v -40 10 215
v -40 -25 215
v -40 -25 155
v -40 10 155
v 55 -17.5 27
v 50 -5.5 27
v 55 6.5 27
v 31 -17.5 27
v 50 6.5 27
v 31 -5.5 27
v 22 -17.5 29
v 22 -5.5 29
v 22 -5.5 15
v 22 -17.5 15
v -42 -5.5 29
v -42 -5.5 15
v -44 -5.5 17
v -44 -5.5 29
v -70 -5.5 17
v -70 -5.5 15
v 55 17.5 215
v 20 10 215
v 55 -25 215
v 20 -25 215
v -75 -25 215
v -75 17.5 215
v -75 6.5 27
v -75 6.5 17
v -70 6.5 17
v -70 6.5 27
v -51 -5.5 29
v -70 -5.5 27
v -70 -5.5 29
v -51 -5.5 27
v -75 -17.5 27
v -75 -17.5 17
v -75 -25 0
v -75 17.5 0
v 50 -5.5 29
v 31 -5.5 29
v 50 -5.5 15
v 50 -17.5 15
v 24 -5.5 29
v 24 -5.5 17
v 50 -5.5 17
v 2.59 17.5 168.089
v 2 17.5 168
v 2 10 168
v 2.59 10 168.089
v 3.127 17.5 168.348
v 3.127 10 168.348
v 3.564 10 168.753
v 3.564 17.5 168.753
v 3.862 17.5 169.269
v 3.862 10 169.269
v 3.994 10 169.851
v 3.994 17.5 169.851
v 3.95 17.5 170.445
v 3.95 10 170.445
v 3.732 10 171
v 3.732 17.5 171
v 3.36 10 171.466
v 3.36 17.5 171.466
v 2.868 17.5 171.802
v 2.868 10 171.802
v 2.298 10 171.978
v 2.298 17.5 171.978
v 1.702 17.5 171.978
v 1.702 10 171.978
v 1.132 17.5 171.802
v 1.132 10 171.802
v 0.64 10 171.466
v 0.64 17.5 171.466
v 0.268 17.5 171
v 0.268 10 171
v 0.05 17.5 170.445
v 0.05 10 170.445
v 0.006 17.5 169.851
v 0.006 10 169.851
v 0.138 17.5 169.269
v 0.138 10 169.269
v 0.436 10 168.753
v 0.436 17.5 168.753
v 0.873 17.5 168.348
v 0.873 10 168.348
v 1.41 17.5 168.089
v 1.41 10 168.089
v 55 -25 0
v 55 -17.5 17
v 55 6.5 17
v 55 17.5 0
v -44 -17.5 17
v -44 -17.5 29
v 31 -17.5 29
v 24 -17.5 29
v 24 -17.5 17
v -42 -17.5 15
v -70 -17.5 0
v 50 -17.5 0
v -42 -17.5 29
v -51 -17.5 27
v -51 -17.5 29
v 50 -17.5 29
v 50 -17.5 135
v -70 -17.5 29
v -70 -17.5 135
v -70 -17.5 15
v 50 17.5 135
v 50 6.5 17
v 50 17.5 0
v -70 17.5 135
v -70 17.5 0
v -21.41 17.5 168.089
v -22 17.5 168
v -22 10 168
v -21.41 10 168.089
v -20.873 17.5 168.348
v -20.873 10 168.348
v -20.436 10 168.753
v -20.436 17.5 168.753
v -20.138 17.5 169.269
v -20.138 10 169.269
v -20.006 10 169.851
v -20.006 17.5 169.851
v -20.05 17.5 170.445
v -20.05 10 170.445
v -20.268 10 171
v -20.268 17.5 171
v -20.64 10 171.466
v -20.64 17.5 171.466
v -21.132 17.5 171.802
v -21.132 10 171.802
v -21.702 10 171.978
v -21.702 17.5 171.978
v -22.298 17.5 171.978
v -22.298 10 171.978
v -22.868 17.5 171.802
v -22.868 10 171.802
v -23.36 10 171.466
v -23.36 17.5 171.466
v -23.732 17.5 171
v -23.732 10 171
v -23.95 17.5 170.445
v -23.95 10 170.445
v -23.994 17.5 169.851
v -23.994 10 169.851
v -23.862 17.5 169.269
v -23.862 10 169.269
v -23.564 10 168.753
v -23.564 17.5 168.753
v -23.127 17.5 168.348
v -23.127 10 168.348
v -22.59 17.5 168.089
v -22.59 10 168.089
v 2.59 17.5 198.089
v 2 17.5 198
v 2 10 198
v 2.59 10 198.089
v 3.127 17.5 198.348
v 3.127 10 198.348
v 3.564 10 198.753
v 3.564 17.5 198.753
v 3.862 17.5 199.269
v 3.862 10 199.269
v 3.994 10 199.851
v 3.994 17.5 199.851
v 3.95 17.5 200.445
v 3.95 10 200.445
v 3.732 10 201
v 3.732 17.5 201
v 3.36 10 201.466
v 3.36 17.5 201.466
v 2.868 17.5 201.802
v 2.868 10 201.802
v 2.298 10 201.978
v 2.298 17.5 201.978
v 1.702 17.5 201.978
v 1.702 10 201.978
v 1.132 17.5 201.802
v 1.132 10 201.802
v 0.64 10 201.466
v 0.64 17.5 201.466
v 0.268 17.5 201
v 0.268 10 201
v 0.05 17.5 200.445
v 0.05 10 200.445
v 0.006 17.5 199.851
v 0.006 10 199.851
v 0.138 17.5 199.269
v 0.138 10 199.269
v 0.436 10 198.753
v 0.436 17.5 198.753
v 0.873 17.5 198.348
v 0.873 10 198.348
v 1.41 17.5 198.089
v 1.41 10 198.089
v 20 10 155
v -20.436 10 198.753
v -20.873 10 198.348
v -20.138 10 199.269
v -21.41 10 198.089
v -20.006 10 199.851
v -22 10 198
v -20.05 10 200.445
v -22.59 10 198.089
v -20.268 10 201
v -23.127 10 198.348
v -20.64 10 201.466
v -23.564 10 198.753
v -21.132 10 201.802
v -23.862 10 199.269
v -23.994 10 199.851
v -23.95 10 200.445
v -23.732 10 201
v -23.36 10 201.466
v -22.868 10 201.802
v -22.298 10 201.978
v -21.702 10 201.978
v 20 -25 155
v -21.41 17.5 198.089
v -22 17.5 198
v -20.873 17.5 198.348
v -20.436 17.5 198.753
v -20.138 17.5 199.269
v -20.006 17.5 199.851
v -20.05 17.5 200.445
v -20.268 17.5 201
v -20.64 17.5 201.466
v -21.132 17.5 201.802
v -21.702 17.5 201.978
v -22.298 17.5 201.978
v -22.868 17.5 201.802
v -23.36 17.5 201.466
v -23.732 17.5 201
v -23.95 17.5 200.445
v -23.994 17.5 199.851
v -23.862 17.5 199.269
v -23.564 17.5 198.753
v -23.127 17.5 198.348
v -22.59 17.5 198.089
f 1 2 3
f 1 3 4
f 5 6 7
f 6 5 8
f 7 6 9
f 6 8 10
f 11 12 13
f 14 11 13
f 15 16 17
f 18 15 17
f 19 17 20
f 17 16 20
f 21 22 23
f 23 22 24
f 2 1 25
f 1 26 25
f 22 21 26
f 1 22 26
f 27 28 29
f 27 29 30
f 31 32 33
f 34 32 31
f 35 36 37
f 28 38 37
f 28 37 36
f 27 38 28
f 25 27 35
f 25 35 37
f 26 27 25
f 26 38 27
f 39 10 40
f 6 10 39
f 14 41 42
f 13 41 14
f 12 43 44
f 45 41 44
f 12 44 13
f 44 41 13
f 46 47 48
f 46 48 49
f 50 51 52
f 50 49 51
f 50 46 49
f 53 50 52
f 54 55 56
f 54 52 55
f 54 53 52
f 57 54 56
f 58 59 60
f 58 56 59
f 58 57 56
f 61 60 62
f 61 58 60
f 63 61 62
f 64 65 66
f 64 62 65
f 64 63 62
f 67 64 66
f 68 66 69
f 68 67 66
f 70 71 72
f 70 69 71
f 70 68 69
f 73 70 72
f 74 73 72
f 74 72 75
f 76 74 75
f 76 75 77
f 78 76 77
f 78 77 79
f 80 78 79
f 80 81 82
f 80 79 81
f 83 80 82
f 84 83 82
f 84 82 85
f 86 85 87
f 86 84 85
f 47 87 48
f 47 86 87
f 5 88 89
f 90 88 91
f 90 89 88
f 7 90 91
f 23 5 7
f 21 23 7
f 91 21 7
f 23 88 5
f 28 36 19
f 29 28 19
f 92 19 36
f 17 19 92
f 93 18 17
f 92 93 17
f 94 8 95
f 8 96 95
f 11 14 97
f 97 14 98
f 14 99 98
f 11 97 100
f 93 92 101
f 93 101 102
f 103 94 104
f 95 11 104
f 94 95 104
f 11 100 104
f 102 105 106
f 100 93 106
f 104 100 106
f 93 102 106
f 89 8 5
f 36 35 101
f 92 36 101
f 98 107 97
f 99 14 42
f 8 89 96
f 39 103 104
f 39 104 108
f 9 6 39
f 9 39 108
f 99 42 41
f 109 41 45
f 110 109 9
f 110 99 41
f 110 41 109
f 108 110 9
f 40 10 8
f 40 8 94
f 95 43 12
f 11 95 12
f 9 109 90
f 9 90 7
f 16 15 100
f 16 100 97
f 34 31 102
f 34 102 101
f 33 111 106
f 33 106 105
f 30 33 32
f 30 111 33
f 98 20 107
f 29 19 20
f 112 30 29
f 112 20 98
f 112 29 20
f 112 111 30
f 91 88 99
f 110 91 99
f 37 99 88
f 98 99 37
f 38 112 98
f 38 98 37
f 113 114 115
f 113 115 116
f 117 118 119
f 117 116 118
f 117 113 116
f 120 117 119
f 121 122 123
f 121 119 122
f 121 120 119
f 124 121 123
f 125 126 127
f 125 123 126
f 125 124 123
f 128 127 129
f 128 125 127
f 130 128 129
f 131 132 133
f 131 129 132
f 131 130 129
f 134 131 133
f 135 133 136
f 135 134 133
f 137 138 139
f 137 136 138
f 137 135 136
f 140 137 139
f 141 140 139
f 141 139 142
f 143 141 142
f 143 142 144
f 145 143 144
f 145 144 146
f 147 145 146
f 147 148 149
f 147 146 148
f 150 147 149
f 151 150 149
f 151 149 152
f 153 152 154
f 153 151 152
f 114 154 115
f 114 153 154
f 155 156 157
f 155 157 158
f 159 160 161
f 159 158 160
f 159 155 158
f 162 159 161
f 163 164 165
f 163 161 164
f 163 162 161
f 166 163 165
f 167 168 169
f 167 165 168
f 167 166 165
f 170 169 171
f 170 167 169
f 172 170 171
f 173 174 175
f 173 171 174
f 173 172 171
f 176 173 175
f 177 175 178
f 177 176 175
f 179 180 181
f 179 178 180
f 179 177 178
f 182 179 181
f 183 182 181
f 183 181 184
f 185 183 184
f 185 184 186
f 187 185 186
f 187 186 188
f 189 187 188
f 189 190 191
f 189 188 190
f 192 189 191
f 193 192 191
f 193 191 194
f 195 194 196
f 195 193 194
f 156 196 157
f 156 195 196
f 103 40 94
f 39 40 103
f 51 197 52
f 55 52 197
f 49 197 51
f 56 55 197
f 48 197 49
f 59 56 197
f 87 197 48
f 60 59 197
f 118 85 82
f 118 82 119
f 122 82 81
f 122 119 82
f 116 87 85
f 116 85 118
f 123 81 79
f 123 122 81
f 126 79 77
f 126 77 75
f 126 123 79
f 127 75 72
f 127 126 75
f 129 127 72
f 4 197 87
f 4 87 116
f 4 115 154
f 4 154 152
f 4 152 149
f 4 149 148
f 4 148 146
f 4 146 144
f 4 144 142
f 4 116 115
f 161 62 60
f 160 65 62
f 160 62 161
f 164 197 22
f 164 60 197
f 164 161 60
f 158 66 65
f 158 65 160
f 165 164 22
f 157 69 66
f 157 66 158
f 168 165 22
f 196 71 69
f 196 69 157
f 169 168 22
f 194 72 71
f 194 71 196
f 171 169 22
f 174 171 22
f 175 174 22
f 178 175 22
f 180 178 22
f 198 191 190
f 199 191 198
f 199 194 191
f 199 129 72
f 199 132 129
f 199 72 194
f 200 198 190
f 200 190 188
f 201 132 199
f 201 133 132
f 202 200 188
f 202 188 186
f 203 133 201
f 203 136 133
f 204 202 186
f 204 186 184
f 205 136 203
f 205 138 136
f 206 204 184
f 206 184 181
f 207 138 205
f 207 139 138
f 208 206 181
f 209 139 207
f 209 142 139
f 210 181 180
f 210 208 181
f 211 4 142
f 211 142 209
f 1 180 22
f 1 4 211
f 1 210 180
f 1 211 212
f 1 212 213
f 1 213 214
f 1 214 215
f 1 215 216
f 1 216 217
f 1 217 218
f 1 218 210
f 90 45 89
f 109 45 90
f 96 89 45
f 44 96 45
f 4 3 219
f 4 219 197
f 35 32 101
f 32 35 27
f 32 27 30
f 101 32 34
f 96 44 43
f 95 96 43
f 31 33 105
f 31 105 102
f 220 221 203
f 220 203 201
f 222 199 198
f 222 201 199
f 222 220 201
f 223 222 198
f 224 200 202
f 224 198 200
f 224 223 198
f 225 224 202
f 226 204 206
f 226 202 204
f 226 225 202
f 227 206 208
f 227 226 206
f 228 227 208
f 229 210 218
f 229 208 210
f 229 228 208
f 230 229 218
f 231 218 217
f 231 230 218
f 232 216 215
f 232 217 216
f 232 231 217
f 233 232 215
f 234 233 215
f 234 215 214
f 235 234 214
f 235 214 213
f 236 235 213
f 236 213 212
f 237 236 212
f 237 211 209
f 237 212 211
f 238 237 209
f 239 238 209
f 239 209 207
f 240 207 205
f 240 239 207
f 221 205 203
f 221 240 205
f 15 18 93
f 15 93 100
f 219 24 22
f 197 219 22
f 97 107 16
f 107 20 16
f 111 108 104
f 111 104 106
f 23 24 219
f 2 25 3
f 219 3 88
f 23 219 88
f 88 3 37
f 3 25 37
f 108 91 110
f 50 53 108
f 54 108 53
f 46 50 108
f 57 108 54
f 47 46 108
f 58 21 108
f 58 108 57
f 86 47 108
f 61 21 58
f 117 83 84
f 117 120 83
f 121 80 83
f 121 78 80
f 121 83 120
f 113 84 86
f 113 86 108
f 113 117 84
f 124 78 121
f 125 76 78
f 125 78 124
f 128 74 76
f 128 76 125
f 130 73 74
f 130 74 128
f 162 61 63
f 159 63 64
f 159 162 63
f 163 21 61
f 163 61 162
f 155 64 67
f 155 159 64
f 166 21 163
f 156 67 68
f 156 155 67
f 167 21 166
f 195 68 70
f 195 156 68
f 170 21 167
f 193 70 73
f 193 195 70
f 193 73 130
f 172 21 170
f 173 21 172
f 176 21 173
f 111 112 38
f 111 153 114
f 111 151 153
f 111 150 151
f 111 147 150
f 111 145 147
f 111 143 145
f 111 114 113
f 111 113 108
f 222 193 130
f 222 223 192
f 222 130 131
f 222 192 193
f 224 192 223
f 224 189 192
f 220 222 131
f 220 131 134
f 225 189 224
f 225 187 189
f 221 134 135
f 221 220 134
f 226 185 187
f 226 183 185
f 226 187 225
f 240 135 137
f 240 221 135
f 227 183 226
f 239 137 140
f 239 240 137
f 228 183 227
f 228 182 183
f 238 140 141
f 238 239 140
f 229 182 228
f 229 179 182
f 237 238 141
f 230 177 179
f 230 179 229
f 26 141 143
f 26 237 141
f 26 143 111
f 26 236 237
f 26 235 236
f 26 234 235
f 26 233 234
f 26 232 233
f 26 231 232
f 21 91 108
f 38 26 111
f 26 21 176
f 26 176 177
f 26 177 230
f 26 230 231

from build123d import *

# Parameters (mm, degrees)
SKETCH2_W                = 150
SKETCH2_H                = 40
BOSS_EXTRUDE1_DEPTH      = 225
SKETCH3_W                = 140
SKETCH3_H                = 35
CUT_EXTRUDE1_DEPTH       = 50
SKETCH4_W                = 26
SKETCH4_H                = 2
SKETCH4_W_2              = 20
BOSS_EXTRUDE2_DEPTH      = 15
SKETCH6_W                = 10
SKETCH6_H                = 15
CUT_EXTRUDE2_DEPTH       = 15
CUT_EXTRUDE3_DEPTH       = 67
SKETCH9_W                = 10
SKETCH9_H                = 15
CUT_EXTRUDE4_DEPTH       = 67
SKETCH12_W               = 14
SKETCH12_H               = 2
BOSS_EXTRUDE3_DEPTH      = 2.5
FILLET1_R                = 0.5
MIRROR3_START            = 196
MIRROR3_DEPTH            = 14
MIRROR3_START_2          = 15
MIRROR3_2_DEPTH          = 14
MIRROR3_3_DEPTH          = 2
MIRROR3_START_3          = 208
MIRROR3_4_DEPTH          = 2
MIRROR3_5_DEPTH          = 2
MIRROR3_START_4          = 27
MIRROR3_6_DEPTH          = 2
SKETCH16_W               = 32.5
SKETCH16_H               = 11.5
BOSS_EXTRUDE5_DEPTH      = 5
SKETCH17_R               = 1
BOSS_EXTRUDE7_DEPTH      = 25
SKETCH18_W               = 5
SKETCH18_H               = 50
SKETCH18_W_2             = 10
SKETCH18_H_2             = 5
BOSS_EXTRUDE8_DEPTH      = 7.5
SKETCH24_W               = 5.5
SKETCH24_H               = 28
BOSS_EXTRUDE11_DEPTH     = 50
SKETCH25_W               = 5
SKETCH25_H               = 28
BOSS_EXTRUDE12_DEPTH     = 190
SKETCH26_W               = 5
SKETCH26_H               = 28
BOSS_EXTRUDE13_DEPTH     = 190
SKETCH27_R               = 2.55
BOSS_EXTRUDE14_DEPTH     = 10
SKETCH29_W               = 10
SKETCH29_H               = 15
CUT_EXTRUDE5_DEPTH       = 19
SKETCH30_W               = 15
SKETCH30_H               = 20
BOSS_EXTRUDE15_DEPTH     = 7.5
SKETCH33_W               = 140
SKETCH33_H               = 35
BOSS_EXTRUDE16_DEPTH     = 50
BOSS_EXTRUDE18_DEPTH     = 5
CUT_EXTRUDE9_DEPTH       = 303.293317822
CUT_EXTRUDE9_DEPTH_BACK  = 303.293317822
SKETCH37_W               = 10
SKETCH37_H               = 45
SKETCH41_W               = 150
SKETCH41_H               = 50
CUT_EXTRUDE12_DEPTH      = 2.5
SKETCH42_W               = 2
SKETCH42_H               = 12
CUT_EXTRUDE13_DEPTH      = 15
SKETCH43_W               = 1
SKETCH43_H               = 2
CUT_EXTRUDE14_DEPTH      = 15
SKETCH44_W               = 10
SKETCH44_H               = 3
BOSS_EXTRUDE19_DEPTH     = 5
SKETCH45_W               = 10
SKETCH45_H               = 3
BOSS_EXTRUDE20_DEPTH     = 5
SKETCH46_W               = 65.791508331
SKETCH46_H               = 202.821994136
SKETCH46_W_2             = 83.130638558
CUT_EXTRUDE15_DEPTH      = 257.527288997
SKETCH50_W               = 14
SKETCH50_H               = 2
CUT_EXTRUDE18_DEPTH      = 2.5
SKETCH51_W               = 2
SKETCH51_H               = 14
BOSS_EXTRUDE21_DEPTH     = 15
SKETCH52_W               = 19
SKETCH52_H               = 2
CUT_EXTRUDE19_DEPTH      = 3
SKETCH53_W               = 10
SKETCH53_H               = 12
CUT_EXTRUDE20_DEPTH      = 5
SKETCH54_W               = 14
SKETCH54_H               = 2
CUT_EXTRUDE21_DEPTH      = 2.5
SKETCH55_W               = 1.5
SKETCH55_H               = 2
CUT_EXTRUDE22_DEPTH      = 15
SKETCH56_W               = 2
SKETCH56_H               = 14
BOSS_EXTRUDE22_DEPTH     = 15
SKETCH57_W               = 17.5
SKETCH57_H               = 2
CUT_EXTRUDE23_DEPTH      = 3
SKETCH58_W               = 1.5
SKETCH58_H               = 2
BOSS_EXTRUDE23_DEPTH     = 12
SKETCH59_W               = 10
SKETCH59_H               = 12
CUT_EXTRUDE24_DEPTH      = 5
SKETCH61_W               = 150
SKETCH61_H               = 32.5
CUT_EXTRUDE26_DEPTH      = 230.360524066
SKETCH63_W               = 150
SKETCH63_H               = 165
CUT_EXTRUDE27_DEPTH      = 10
SKETCH71_W               = 215
SKETCH71_H               = 42.5
CUT_EXTRUDE28_DEPTH      = 85
BOSS_EXTRUDE26_DEPTH     = 65
SKETCH73_W               = 10
SKETCH73_H               = 15
BOSS_EXTRUDE27_DEPTH     = 5
BOSS_EXTRUDE28_REACH     = 233.815
BOSS_EXTRUDE28_START     = -3
SKETCH74_W               = 5
SKETCH74_H               = 35
BOSS_EXTRUDE29_DEPTH     = 50
SKETCH75_W               = 10
SKETCH75_H               = 24
CUT_EXTRUDE29_DEPTH      = 14
CUT_EXTRUDE30_DEPTH      = 232.638187698
CUT_EXTRUDE30_DEPTH_BACK = 232.638187698
SKETCH76_R               = 2
CUT_EXTRUDE31_START      = -40
CUT_EXTRUDE31_OUTLINE_W  = 35
CUT_EXTRUDE31_OUTLINE_H  = 60
CUT_EXTRUDE31_DEPTH      = 60
SKETCH78_W               = 120
SKETCH78_H               = 35
CUT_EXTRUDE32_DEPTH      = 85


# Read off the part's stored shape, not the designer's step: Mirror3, Cut-Extrude31
with BuildPart() as part:
    # Sketch2 → Boss-Extrude1 (new body)
    with BuildSketch(Plane.XY):
        Rectangle(SKETCH2_W, SKETCH2_H)
    extrude(amount=BOSS_EXTRUDE1_DEPTH)

    # Sketch3 → Cut-Extrude1 (cut)
    with BuildSketch(Plane.XY.offset(225)):
        Rectangle(SKETCH3_W, SKETCH3_H)
    cut_extrude1 = extrude(amount=-CUT_EXTRUDE1_DEPTH, mode=Mode.SUBTRACT)

    # Sketch4 → Boss-Extrude2 (add)
    with BuildSketch(Plane(origin=(0, -17.5, 0), x_dir=(1, 0, 0), z_dir=(0, 1, 0))):
        Polygon((-42, -196), (-44, -196), (-44, -208), (-44, -210), (-42, -210), align=None)
        with Locations((-57, -209)):
            Rectangle(SKETCH4_W, SKETCH4_H)
        with Locations((-60, -197)):
            Rectangle(SKETCH4_W_2, SKETCH4_H)
        Polygon((70, -210), (70, -208), (44, -208), (44, -196), (42, -196), (42, -210), (44, -210), align=None)
        with Locations((60, -197)):
            Rectangle(SKETCH4_W_2, SKETCH4_H)
    boss_extrude2 = extrude(amount=BOSS_EXTRUDE2_DEPTH)

    # Sketch6 → Cut-Extrude2 (cut)
    with BuildSketch(Plane(origin=(-70, 0, 0), x_dir=(0, 0, -1), z_dir=(1, 0, 0))):
        with Locations((-203, -10)):
            Rectangle(SKETCH6_W, SKETCH6_H)
    cut_extrude2 = extrude(amount=-CUT_EXTRUDE2_DEPTH, mode=Mode.SUBTRACT)

    # Sketch8 → Cut-Extrude3 (cut)
    with BuildSketch(Plane(origin=(0, -17.5, 0), x_dir=(1, 0, 0), z_dir=(0, 1, 0))):
        with BuildLine():
            Line((-64.5, -179.5), (-49.5, -179.5))
            ThreePointArc((-49.5, -179.5), (-46, -183), (-49.5, -186.5))
            Line((-49.5, -186.5), (-64.5, -186.5))
            ThreePointArc((-64.5, -186.5), (-68, -183), (-64.5, -179.5))
        make_face()
        with BuildLine():
            Line((64.5, -179.5), (49.5, -179.5))
            ThreePointArc((49.5, -179.5), (46, -183), (49.5, -186.5))
            Line((49.5, -186.5), (64.5, -186.5))
            ThreePointArc((64.5, -186.5), (68, -183), (64.5, -179.5))
        make_face()
    cut_extrude3 = extrude(amount=CUT_EXTRUDE3_DEPTH, mode=Mode.SUBTRACT)

    # Sketch9 → Cut-Extrude4 (cut)
    with BuildSketch(Plane.ZY.offset(-70)):
        with Locations((203, -10)):
            Rectangle(SKETCH9_W, SKETCH9_H)
    cut_extrude4 = extrude(amount=-CUT_EXTRUDE4_DEPTH, mode=Mode.SUBTRACT)

    # Mirror1: Cut-Extrude1, Boss-Extrude2, Cut-Extrude2, Cut-Extrude3, Cut-Extrude4 across plane
    add(cut_extrude1.mirror(Plane.XY.offset(112.5)), mode=Mode.SUBTRACT)
    add(boss_extrude2.mirror(Plane.XY.offset(112.5)))
    add(cut_extrude2.mirror(Plane.XY.offset(112.5)), mode=Mode.SUBTRACT)
    add(cut_extrude3.mirror(Plane.XY.offset(112.5)), mode=Mode.SUBTRACT)
    add(cut_extrude4.mirror(Plane.XY.offset(112.5)), mode=Mode.SUBTRACT)

    # Sketch12 → Boss-Extrude3 (add)
    with BuildSketch(Plane.ZY.offset(-70)):
        with Locations((22, -1.5)):
            Rectangle(SKETCH12_W, SKETCH12_H)
    extrude(amount=BOSS_EXTRUDE3_DEPTH)

    # Fillet1
    fillet1_edges = [part.edges().sort_by_distance(p)[0] for p in [
        (67.5, -2.5, 22),
    ]]
    fillet(fillet1_edges, radius=FILLET1_R)

    # Mirror3 outline → Mirror3 (add)
    with BuildSketch(Plane.XY.offset(MIRROR3_START)):
        with BuildLine():
            Line((-70, -2.5), (-68, -2.5))
            ThreePointArc((-68, -2.5), (-67.646446609, -2.353553391), (-67.5, -2))
            Line((-67.5, -2), (-67.5, -0.5))
            Line((-67.5, -0.5), (-70, -0.5))
            Line((-70, -0.5), (-70, -2.5))
        make_face()
        with BuildLine():
            Line((68, -2.5), (70, -2.5))
            Line((70, -2.5), (70, -0.5))
            Line((70, -0.5), (67.5, -0.5))
            Line((67.5, -0.5), (67.5, -2))
            ThreePointArc((67.5, -2), (67.646446609, -2.353553391), (68, -2.5))
        make_face()
    extrude(amount=MIRROR3_DEPTH)

    # Mirror3 2 outline → Mirror3 2 (add)
    with BuildSketch(Plane.XY.offset(MIRROR3_START_2)):
        with BuildLine():
            Line((-70, -2.5), (-68, -2.5))
            ThreePointArc((-68, -2.5), (-67.646446609, -2.353553391), (-67.5, -2))
            Line((-67.5, -2), (-67.5, -0.5))
            Line((-67.5, -0.5), (-70, -0.5))
            Line((-70, -0.5), (-70, -2.5))
        make_face()
    extrude(amount=MIRROR3_2_DEPTH)

    # Mirror3 3 outline → Mirror3 3 (add)
    with BuildSketch(Plane.XY.offset(MIRROR3_START)):
        with BuildLine():
            ThreePointArc((-67.5, -2), (-67.646446609, -2.353553391), (-68, -2.5))
            Line((-68, -2.5), (-67.5, -2.5))
            Line((-67.5, -2.5), (-67.5, -2))
        make_face()
        with BuildLine():
            Line((67.5, -2.5), (68, -2.5))
            ThreePointArc((68, -2.5), (67.646446609, -2.353553391), (67.5, -2))
            Line((67.5, -2), (67.5, -2.5))
        make_face()
    extrude(amount=MIRROR3_3_DEPTH)

    # Mirror3 4 outline → Mirror3 4 (add)
    with BuildSketch(Plane.XY.offset(MIRROR3_START_3)):
        with BuildLine():
            ThreePointArc((-67.5, -2), (-67.646446609, -2.353553391), (-68, -2.5))
            Line((-68, -2.5), (-67.5, -2.5))
            Line((-67.5, -2.5), (-67.5, -2))
        make_face()
        with BuildLine():
            Line((67.5, -2.5), (68, -2.5))
            ThreePointArc((68, -2.5), (67.646446609, -2.353553391), (67.5, -2))
            Line((67.5, -2), (67.5, -2.5))
        make_face()
    extrude(amount=MIRROR3_4_DEPTH)

    # Mirror3 5 outline → Mirror3 5 (add)
    with BuildSketch(Plane.XY.offset(MIRROR3_START_2)):
        with BuildLine():
            ThreePointArc((-67.5, -2), (-67.646446609, -2.353553391), (-68, -2.5))
            Line((-68, -2.5), (-67.5, -2.5))
            Line((-67.5, -2.5), (-67.5, -2))
        make_face()
    extrude(amount=MIRROR3_5_DEPTH)

    # Mirror3 6 outline → Mirror3 6 (add)
    with BuildSketch(Plane.XY.offset(MIRROR3_START_4)):
        with BuildLine():
            ThreePointArc((-67.5, -2), (-67.646446609, -2.353553391), (-68, -2.5))
            Line((-68, -2.5), (-67.5, -2.5))
            Line((-67.5, -2.5), (-67.5, -2))
        make_face()
    extrude(amount=MIRROR3_6_DEPTH)

    # Sketch16 → Boss-Extrude5 (add)
    with BuildSketch(Plane(origin=(-70, 0, 0), x_dir=(0, 0, -1), z_dir=(1, 0, 0))):
        with Locations((16.25, -14.25)):
            Rectangle(SKETCH16_W, SKETCH16_H)
    boss_extrude5 = extrude(amount=-BOSS_EXTRUDE5_DEPTH)

    # Mirror4: Boss-Extrude5 across plane
    add(boss_extrude5.mirror(Plane(origin=(0, 0, 0), x_dir=(0, 0, 1), z_dir=(1, 0, 0))))

    # Sketch17 → Boss-Extrude7 (add)
    with BuildSketch(Plane.ZY.offset(-70)):
        with Locations(Location((-29.5, -14.25, 0), (0, 0, 270))):
            Circle(SKETCH17_R)
        with Locations(Location((-3, -14.25, 0), (0, 0, 270))):
            Circle(SKETCH17_R)
    boss_extrude7 = extrude(amount=BOSS_EXTRUDE7_DEPTH)

    # Mirror5: Boss-Extrude7 across plane
    add(boss_extrude7.mirror(Plane(origin=(0, 0, 0), x_dir=(0, 0, 1), z_dir=(1, 0, 0))))

    # Sketch18 → Boss-Extrude8 (add)
    with BuildSketch(Plane(origin=(0, 20, 0), x_dir=(1, 0, 0), z_dir=(0, 1, 0))):
        with Locations((-67.5, -80.5)):
            Rectangle(SKETCH18_W, SKETCH18_H)
        with Locations((67.5, -144.5)):
            Rectangle(SKETCH18_W, SKETCH18_H)
        with Locations((-30, -172)):
            Rectangle(SKETCH18_W_2, SKETCH18_H_2)
        with Locations((-30, -117)):
            Rectangle(SKETCH18_W_2, SKETCH18_H_2)
        with Locations((30, -108)):
            Rectangle(SKETCH18_W_2, SKETCH18_H_2)
        with Locations((30, -53)):
            Rectangle(SKETCH18_W_2, SKETCH18_H_2)
    extrude(amount=BOSS_EXTRUDE8_DEPTH)

    # Sketch24 → Boss-Extrude11 (add)
    with BuildSketch(Plane.ZY.offset(75)):
        with Locations((84.75, -6)):
            Rectangle(SKETCH24_W, SKETCH24_H)
    boss_extrude11 = extrude(amount=BOSS_EXTRUDE11_DEPTH)

    # Sketch25 → Boss-Extrude12 (add)
    with BuildSketch(Plane(origin=(0, 0, 82), x_dir=(-1, 0, 0), z_dir=(0, 0, -1))):
        with Locations((122.5, -6)):
            Rectangle(SKETCH25_W, SKETCH25_H)
    extrude(amount=BOSS_EXTRUDE12_DEPTH)

    # Mirror12: Boss-Extrude11 across plane
    add(boss_extrude11.mirror(Plane(origin=(0, 0, 0), x_dir=(0, 0, 1), z_dir=(1, 0, 0))))

    # Sketch26 → Boss-Extrude13 (add)
    with BuildSketch(Plane(origin=(0, 0, 82), x_dir=(-1, 0, 0), z_dir=(0, 0, -1))):
        with Locations((-122.5, -6)):
            Rectangle(SKETCH26_W, SKETCH26_H)
    extrude(amount=BOSS_EXTRUDE13_DEPTH)

    # Sketch27 → Boss-Extrude14 (add)
    with BuildSketch(Plane.ZY.offset(-120)):
        with Locations(Location((-100.5, -6, 0), (0, 0, 180))):
            Circle(SKETCH27_R)
    extrude(amount=BOSS_EXTRUDE14_DEPTH)

    # Sketch29 → Cut-Extrude5 (cut)
    with BuildSketch(Plane.ZY.offset(125)):
        with Locations((-100.5, -6)):
            Rectangle(SKETCH29_W, SKETCH29_H)
    extrude(amount=-CUT_EXTRUDE5_DEPTH, mode=Mode.SUBTRACT)

    # Sketch30 → Boss-Extrude15 (add)
    with BuildSketch(Plane.ZY.offset(125)):
        with Locations((-100.5, -6)):
            Rectangle(SKETCH30_W, SKETCH30_H)
    extrude(amount=BOSS_EXTRUDE15_DEPTH)

    # Sketch33 → Boss-Extrude16 (add)
    with BuildSketch(Plane.XY.offset(175)):
        Rectangle(SKETCH33_W, SKETCH33_H)
    extrude(amount=BOSS_EXTRUDE16_DEPTH)

    # Sketch36 → Boss-Extrude18 (add)
    with BuildSketch(Plane.XZ.offset(20)):
        Polygon((-75, 225), (-75, 87.5), (-125, 87.5), (-125, -108), (-120, -108), (-120, 82), (-75, 82), (-75, -32.5), (-70, -32.5), (-70, 0), (70, 0), (70, -32.5), (75, -32.5), (75, 82), (120, 82), (120, -108), (125, -108), (125, 87.5), (75, 87.5), (75, 225), align=None)
    extrude(amount=BOSS_EXTRUDE18_DEPTH)

    # Sketch37 → Cut-Extrude9 (cut, two sides: drawn at the far end of the back side and taken through both)
    with BuildSketch(Plane.ZY.offset(75).offset(-CUT_EXTRUDE9_DEPTH_BACK)):
        with Locations((220, -2.5)):
            Rectangle(SKETCH37_W, SKETCH37_H)
    extrude(amount=CUT_EXTRUDE9_DEPTH + CUT_EXTRUDE9_DEPTH_BACK, mode=Mode.SUBTRACT)

    # Sketch41 → Cut-Extrude12 (cut)
    with BuildSketch(Plane(origin=(0, 20, 0), x_dir=(1, 0, 0), z_dir=(0, 1, 0))):
        with Locations((0, -25)):
            Rectangle(SKETCH41_W, SKETCH41_H)
    extrude(amount=-CUT_EXTRUDE12_DEPTH, mode=Mode.SUBTRACT)

    # Sketch42 → Cut-Extrude13 (cut)
    with BuildSketch(Plane(origin=(0, -2.5, 0), x_dir=(1, 0, 0), z_dir=(0, 1, 0))):
        with Locations((-43, -23)):
            Rectangle(SKETCH42_W, SKETCH42_H)
        with Locations((43, -23)):
            Rectangle(SKETCH42_W, SKETCH42_H)
    extrude(amount=-CUT_EXTRUDE13_DEPTH, mode=Mode.SUBTRACT)

    # Sketch43 → Cut-Extrude14 (cut)
    with BuildSketch(Plane(origin=(0, -2.5, 0), x_dir=(1, 0, 0), z_dir=(0, 1, 0))):
        with Locations((-50.5, -28)):
            Rectangle(SKETCH43_W, SKETCH43_H)
        with Locations((50.5, -28)):
            Rectangle(SKETCH43_W, SKETCH43_H)
    extrude(amount=-CUT_EXTRUDE14_DEPTH, mode=Mode.SUBTRACT)

    # Sketch44 → Boss-Extrude19 (add)
    with BuildSketch(Plane.ZY.offset(75)):
        with Locations((22, -4)):
            Rectangle(SKETCH44_W, SKETCH44_H)
    extrude(amount=-BOSS_EXTRUDE19_DEPTH)

    # Sketch45 → Boss-Extrude20 (add)
    with BuildSketch(Plane(origin=(75, 0, 0), x_dir=(0, 0, -1), z_dir=(1, 0, 0))):
        with Locations((-22, -4)):
            Rectangle(SKETCH45_W, SKETCH45_H)
    extrude(amount=-BOSS_EXTRUDE20_DEPTH)

    # Sketch46 → Cut-Extrude15 (cut, through all)
    with BuildSketch(Plane(origin=(0, 20, 0), x_dir=(1, 0, 0), z_dir=(0, 1, 0))):
        with Locations((107.895754166, 13.910997068)):
            Rectangle(SKETCH46_W, SKETCH46_H)
        with Locations((-116.565319279, 13.910997068)):
            Rectangle(SKETCH46_W_2, SKETCH46_H)
    extrude(amount=-CUT_EXTRUDE15_DEPTH, mode=Mode.SUBTRACT)

    # Sketch50 → Cut-Extrude18 (cut)
    with BuildSketch(Plane(origin=(-67.5, 0, 0), x_dir=(0, 0, -1), z_dir=(1, 0, 0))):
        with Locations((-22, -1.5)):
            Rectangle(SKETCH50_W, SKETCH50_H)
    extrude(amount=-CUT_EXTRUDE18_DEPTH, mode=Mode.SUBTRACT)

    # Sketch51 → Boss-Extrude21 (add)
    with BuildSketch(Plane(origin=(0, -2.5, 0), x_dir=(1, 0, 0), z_dir=(0, 1, 0))):
        with Locations((-43, -22)):
            Rectangle(SKETCH51_W, SKETCH51_H)
    extrude(amount=-BOSS_EXTRUDE21_DEPTH)

    # Sketch52 → Cut-Extrude19 (cut)
    with BuildSketch(Plane(origin=(0, -2.5, 0), x_dir=(1, 0, 0), z_dir=(0, 1, 0))):
        with Locations((-60.5, -28)):
            Rectangle(SKETCH52_W, SKETCH52_H)
        Polygon((-70, -15), (-44, -15), (-42, -15), (-42, -29), (-44, -29), (-44, -17), (-70, -17), align=None)
    extrude(amount=-CUT_EXTRUDE19_DEPTH, mode=Mode.SUBTRACT)

    # Sketch53 → Cut-Extrude20 (cut)
    with BuildSketch(Plane.ZY.offset(75)):
        with Locations((22, 0.5)):
            Rectangle(SKETCH53_W, SKETCH53_H)
    extrude(amount=-CUT_EXTRUDE20_DEPTH, mode=Mode.SUBTRACT)

    # Sketch54 → Cut-Extrude21 (cut)
    with BuildSketch(Plane.ZY.offset(-67.5)):
        with Locations((22, -1.5)):
            Rectangle(SKETCH54_W, SKETCH54_H)
    extrude(amount=-CUT_EXTRUDE21_DEPTH, mode=Mode.SUBTRACT)

    # Sketch55 → Cut-Extrude22 (cut)
    with BuildSketch(Plane(origin=(0, -2.5, 0), x_dir=(1, 0, 0), z_dir=(0, 1, 0))):
        with Locations((51.75, -28)):
            Rectangle(SKETCH55_W, SKETCH55_H)
    extrude(amount=-CUT_EXTRUDE22_DEPTH, mode=Mode.SUBTRACT)

    # Sketch56 → Boss-Extrude22 (add)
    with BuildSketch(Plane(origin=(0, -2.5, 0), x_dir=(1, 0, 0), z_dir=(0, 1, 0))):
        with Locations((43, -22)):
            Rectangle(SKETCH56_W, SKETCH56_H)
    extrude(amount=-BOSS_EXTRUDE22_DEPTH)

    # Sketch57 → Cut-Extrude23 (cut)
    with BuildSketch(Plane(origin=(0, -2.5, 0), x_dir=(1, 0, 0), z_dir=(0, 1, 0))):
        Polygon((70, -15), (44, -15), (42, -15), (42, -29), (44, -29), (44, -17), (70, -17), align=None)
        with Locations((61.25, -28)):
            Rectangle(SKETCH57_W, SKETCH57_H)
    extrude(amount=-CUT_EXTRUDE23_DEPTH, mode=Mode.SUBTRACT)

    # Sketch58 → Boss-Extrude23 (add)
    with BuildSketch(Plane(origin=(0, -5.5, 0), x_dir=(1, 0, 0), z_dir=(0, 1, 0))):
        with Locations((51.75, -28)):
            Rectangle(SKETCH58_W, SKETCH58_H)
    extrude(amount=-BOSS_EXTRUDE23_DEPTH)

    # Sketch59 → Cut-Extrude24 (cut)
    with BuildSketch(Plane(origin=(75, 0, 0), x_dir=(0, 0, -1), z_dir=(1, 0, 0))):
        with Locations((-22, 0.5)):
            Rectangle(SKETCH59_W, SKETCH59_H)
    extrude(amount=-CUT_EXTRUDE24_DEPTH, mode=Mode.SUBTRACT)

    # Sketch61 → Cut-Extrude26 (cut, through all)
    with BuildSketch(Plane(origin=(0, 0, 0), x_dir=(1, 0, 0), z_dir=(0, 1, 0))):
        with Locations((0, 16.25)):
            Rectangle(SKETCH61_W, SKETCH61_H)
    extrude(amount=-CUT_EXTRUDE26_DEPTH, mode=Mode.SUBTRACT)

    # Sketch63 → Cut-Extrude27 (cut)
    with BuildSketch(Plane(origin=(0, 27.5, 0), x_dir=(1, 0, 0), z_dir=(0, 1, 0))):
        with Locations((0, -132.5)):
            Rectangle(SKETCH63_W, SKETCH63_H)
    extrude(amount=-CUT_EXTRUDE27_DEPTH, mode=Mode.SUBTRACT)

    # Sketch71 → Cut-Extrude28 (cut)
    with BuildSketch(Plane(origin=(75, 0, 0), x_dir=(0, 0, -1), z_dir=(1, 0, 0))):
        with Locations((-107.5, -3.75)):
            Rectangle(SKETCH71_W, SKETCH71_H)
    extrude(amount=-CUT_EXTRUDE28_DEPTH, mode=Mode.SUBTRACT)

    # Sketch72 → Boss-Extrude26 (add)
    with BuildSketch(Plane(origin=(-10, 0, 0), x_dir=(0, 0, -1), z_dir=(1, 0, 0))):
        Polygon((0, -17.5), (-50, -17.5), (-50, 17.5), (-215, 17.5), (-215, -25), (0, -25), align=None)
    extrude(amount=BOSS_EXTRUDE26_DEPTH)

    # Sketch73 → Boss-Extrude27 (add)
    with BuildSketch(Plane.ZY.offset(70)):
        with Locations((203, -10)):
            Rectangle(SKETCH73_W, SKETCH73_H)
    extrude(amount=BOSS_EXTRUDE27_DEPTH)

    # Sketch23 → Boss-Extrude28 (add, up to next)
    with BuildSketch(Plane(origin=(0, -2.5, 0), x_dir=(1, 0, 0), z_dir=(0, 1, 0)).offset(BOSS_EXTRUDE28_START), mode=Mode.PRIVATE) as boss_extrude28_sk1:
        Polygon((31, -27), (31, -29), (47.5, -29), (50, -29), (50, -27), (47.5, -27), align=None)
    boss_extrude28_tool1 = extrude(boss_extrude28_sk1.sketch, amount=-BOSS_EXTRUDE28_REACH, mode=Mode.PRIVATE) - part.part
    # Sketch23 → Boss-Extrude28 (add, up to next)
    with BuildSketch(Plane(origin=(0, -2.5, 0), x_dir=(1, 0, 0), z_dir=(0, 1, 0)).offset(BOSS_EXTRUDE28_START), mode=Mode.PRIVATE) as boss_extrude28_sk2:
        Polygon((50, -17), (47.5, -17), (24, -17), (24, -29), (22, -29), (22, -15), (47.5, -15), (50, -15), align=None)
    boss_extrude28_tool2 = extrude(boss_extrude28_sk2.sketch, amount=-BOSS_EXTRUDE28_REACH, mode=Mode.PRIVATE) - part.part
    add(boss_extrude28_tool1.solids().sort_by_distance((40.5, -5.5, 28))[0])
    add(boss_extrude28_tool2.solids().sort_by_distance((48.75, -5.5, 16.68695))[0])

    # Sketch74 → Boss-Extrude29 (add)
    with BuildSketch(Plane(origin=(0, 0, 50), x_dir=(-1, 0, 0), z_dir=(0, 0, -1))):
        with Locations((-52.5, 0)):
            Rectangle(SKETCH74_W, SKETCH74_H)
    extrude(amount=BOSS_EXTRUDE29_DEPTH)

    # Sketch75 → Cut-Extrude29 (cut)
    with BuildSketch(Plane.ZY.offset(-50)):
        with Locations((22, -5.5)):
            Rectangle(SKETCH75_W, SKETCH75_H)
    extrude(amount=-CUT_EXTRUDE29_DEPTH, mode=Mode.SUBTRACT)

    # Sketch76 → Cut-Extrude30 (cut, two sides: drawn at the far end of the back side and taken through both)
    with BuildSketch(Plane.XZ.offset(25).offset(-CUT_EXTRUDE30_DEPTH_BACK)):
        with Locations(Location((2, 170, 0), (0, 0, 270))):
            Circle(SKETCH76_R)
        with Locations(Location((-22, 170, 0), (0, 0, 270))):
            Circle(SKETCH76_R)
        with Locations(Location((-22, 200, 0), (0, 0, 270))):
            Circle(SKETCH76_R)
        with Locations(Location((2, 200, 0), (0, 0, 270))):
            Circle(SKETCH76_R)
    extrude(amount=CUT_EXTRUDE30_DEPTH + CUT_EXTRUDE30_DEPTH_BACK, mode=Mode.SUBTRACT)

    # Cut-Extrude31 outline → Cut-Extrude31 (cut)
    with BuildSketch(Plane.YZ.offset(CUT_EXTRUDE31_START)):
        with Locations((-7.5, 185)):
            Rectangle(CUT_EXTRUDE31_OUTLINE_W, CUT_EXTRUDE31_OUTLINE_H)
    extrude(amount=CUT_EXTRUDE31_DEPTH, mode=Mode.SUBTRACT)

    # Sketch78 → Cut-Extrude32 (cut)
    with BuildSketch(Plane(origin=(0, 0, 50), x_dir=(-1, 0, 0), z_dir=(0, 0, -1))):
        with Locations((10, 0)):
            Rectangle(SKETCH78_W, SKETCH78_H)
    extrude(amount=-CUT_EXTRUDE32_DEPTH, mode=Mode.SUBTRACT)


solid = part.part
